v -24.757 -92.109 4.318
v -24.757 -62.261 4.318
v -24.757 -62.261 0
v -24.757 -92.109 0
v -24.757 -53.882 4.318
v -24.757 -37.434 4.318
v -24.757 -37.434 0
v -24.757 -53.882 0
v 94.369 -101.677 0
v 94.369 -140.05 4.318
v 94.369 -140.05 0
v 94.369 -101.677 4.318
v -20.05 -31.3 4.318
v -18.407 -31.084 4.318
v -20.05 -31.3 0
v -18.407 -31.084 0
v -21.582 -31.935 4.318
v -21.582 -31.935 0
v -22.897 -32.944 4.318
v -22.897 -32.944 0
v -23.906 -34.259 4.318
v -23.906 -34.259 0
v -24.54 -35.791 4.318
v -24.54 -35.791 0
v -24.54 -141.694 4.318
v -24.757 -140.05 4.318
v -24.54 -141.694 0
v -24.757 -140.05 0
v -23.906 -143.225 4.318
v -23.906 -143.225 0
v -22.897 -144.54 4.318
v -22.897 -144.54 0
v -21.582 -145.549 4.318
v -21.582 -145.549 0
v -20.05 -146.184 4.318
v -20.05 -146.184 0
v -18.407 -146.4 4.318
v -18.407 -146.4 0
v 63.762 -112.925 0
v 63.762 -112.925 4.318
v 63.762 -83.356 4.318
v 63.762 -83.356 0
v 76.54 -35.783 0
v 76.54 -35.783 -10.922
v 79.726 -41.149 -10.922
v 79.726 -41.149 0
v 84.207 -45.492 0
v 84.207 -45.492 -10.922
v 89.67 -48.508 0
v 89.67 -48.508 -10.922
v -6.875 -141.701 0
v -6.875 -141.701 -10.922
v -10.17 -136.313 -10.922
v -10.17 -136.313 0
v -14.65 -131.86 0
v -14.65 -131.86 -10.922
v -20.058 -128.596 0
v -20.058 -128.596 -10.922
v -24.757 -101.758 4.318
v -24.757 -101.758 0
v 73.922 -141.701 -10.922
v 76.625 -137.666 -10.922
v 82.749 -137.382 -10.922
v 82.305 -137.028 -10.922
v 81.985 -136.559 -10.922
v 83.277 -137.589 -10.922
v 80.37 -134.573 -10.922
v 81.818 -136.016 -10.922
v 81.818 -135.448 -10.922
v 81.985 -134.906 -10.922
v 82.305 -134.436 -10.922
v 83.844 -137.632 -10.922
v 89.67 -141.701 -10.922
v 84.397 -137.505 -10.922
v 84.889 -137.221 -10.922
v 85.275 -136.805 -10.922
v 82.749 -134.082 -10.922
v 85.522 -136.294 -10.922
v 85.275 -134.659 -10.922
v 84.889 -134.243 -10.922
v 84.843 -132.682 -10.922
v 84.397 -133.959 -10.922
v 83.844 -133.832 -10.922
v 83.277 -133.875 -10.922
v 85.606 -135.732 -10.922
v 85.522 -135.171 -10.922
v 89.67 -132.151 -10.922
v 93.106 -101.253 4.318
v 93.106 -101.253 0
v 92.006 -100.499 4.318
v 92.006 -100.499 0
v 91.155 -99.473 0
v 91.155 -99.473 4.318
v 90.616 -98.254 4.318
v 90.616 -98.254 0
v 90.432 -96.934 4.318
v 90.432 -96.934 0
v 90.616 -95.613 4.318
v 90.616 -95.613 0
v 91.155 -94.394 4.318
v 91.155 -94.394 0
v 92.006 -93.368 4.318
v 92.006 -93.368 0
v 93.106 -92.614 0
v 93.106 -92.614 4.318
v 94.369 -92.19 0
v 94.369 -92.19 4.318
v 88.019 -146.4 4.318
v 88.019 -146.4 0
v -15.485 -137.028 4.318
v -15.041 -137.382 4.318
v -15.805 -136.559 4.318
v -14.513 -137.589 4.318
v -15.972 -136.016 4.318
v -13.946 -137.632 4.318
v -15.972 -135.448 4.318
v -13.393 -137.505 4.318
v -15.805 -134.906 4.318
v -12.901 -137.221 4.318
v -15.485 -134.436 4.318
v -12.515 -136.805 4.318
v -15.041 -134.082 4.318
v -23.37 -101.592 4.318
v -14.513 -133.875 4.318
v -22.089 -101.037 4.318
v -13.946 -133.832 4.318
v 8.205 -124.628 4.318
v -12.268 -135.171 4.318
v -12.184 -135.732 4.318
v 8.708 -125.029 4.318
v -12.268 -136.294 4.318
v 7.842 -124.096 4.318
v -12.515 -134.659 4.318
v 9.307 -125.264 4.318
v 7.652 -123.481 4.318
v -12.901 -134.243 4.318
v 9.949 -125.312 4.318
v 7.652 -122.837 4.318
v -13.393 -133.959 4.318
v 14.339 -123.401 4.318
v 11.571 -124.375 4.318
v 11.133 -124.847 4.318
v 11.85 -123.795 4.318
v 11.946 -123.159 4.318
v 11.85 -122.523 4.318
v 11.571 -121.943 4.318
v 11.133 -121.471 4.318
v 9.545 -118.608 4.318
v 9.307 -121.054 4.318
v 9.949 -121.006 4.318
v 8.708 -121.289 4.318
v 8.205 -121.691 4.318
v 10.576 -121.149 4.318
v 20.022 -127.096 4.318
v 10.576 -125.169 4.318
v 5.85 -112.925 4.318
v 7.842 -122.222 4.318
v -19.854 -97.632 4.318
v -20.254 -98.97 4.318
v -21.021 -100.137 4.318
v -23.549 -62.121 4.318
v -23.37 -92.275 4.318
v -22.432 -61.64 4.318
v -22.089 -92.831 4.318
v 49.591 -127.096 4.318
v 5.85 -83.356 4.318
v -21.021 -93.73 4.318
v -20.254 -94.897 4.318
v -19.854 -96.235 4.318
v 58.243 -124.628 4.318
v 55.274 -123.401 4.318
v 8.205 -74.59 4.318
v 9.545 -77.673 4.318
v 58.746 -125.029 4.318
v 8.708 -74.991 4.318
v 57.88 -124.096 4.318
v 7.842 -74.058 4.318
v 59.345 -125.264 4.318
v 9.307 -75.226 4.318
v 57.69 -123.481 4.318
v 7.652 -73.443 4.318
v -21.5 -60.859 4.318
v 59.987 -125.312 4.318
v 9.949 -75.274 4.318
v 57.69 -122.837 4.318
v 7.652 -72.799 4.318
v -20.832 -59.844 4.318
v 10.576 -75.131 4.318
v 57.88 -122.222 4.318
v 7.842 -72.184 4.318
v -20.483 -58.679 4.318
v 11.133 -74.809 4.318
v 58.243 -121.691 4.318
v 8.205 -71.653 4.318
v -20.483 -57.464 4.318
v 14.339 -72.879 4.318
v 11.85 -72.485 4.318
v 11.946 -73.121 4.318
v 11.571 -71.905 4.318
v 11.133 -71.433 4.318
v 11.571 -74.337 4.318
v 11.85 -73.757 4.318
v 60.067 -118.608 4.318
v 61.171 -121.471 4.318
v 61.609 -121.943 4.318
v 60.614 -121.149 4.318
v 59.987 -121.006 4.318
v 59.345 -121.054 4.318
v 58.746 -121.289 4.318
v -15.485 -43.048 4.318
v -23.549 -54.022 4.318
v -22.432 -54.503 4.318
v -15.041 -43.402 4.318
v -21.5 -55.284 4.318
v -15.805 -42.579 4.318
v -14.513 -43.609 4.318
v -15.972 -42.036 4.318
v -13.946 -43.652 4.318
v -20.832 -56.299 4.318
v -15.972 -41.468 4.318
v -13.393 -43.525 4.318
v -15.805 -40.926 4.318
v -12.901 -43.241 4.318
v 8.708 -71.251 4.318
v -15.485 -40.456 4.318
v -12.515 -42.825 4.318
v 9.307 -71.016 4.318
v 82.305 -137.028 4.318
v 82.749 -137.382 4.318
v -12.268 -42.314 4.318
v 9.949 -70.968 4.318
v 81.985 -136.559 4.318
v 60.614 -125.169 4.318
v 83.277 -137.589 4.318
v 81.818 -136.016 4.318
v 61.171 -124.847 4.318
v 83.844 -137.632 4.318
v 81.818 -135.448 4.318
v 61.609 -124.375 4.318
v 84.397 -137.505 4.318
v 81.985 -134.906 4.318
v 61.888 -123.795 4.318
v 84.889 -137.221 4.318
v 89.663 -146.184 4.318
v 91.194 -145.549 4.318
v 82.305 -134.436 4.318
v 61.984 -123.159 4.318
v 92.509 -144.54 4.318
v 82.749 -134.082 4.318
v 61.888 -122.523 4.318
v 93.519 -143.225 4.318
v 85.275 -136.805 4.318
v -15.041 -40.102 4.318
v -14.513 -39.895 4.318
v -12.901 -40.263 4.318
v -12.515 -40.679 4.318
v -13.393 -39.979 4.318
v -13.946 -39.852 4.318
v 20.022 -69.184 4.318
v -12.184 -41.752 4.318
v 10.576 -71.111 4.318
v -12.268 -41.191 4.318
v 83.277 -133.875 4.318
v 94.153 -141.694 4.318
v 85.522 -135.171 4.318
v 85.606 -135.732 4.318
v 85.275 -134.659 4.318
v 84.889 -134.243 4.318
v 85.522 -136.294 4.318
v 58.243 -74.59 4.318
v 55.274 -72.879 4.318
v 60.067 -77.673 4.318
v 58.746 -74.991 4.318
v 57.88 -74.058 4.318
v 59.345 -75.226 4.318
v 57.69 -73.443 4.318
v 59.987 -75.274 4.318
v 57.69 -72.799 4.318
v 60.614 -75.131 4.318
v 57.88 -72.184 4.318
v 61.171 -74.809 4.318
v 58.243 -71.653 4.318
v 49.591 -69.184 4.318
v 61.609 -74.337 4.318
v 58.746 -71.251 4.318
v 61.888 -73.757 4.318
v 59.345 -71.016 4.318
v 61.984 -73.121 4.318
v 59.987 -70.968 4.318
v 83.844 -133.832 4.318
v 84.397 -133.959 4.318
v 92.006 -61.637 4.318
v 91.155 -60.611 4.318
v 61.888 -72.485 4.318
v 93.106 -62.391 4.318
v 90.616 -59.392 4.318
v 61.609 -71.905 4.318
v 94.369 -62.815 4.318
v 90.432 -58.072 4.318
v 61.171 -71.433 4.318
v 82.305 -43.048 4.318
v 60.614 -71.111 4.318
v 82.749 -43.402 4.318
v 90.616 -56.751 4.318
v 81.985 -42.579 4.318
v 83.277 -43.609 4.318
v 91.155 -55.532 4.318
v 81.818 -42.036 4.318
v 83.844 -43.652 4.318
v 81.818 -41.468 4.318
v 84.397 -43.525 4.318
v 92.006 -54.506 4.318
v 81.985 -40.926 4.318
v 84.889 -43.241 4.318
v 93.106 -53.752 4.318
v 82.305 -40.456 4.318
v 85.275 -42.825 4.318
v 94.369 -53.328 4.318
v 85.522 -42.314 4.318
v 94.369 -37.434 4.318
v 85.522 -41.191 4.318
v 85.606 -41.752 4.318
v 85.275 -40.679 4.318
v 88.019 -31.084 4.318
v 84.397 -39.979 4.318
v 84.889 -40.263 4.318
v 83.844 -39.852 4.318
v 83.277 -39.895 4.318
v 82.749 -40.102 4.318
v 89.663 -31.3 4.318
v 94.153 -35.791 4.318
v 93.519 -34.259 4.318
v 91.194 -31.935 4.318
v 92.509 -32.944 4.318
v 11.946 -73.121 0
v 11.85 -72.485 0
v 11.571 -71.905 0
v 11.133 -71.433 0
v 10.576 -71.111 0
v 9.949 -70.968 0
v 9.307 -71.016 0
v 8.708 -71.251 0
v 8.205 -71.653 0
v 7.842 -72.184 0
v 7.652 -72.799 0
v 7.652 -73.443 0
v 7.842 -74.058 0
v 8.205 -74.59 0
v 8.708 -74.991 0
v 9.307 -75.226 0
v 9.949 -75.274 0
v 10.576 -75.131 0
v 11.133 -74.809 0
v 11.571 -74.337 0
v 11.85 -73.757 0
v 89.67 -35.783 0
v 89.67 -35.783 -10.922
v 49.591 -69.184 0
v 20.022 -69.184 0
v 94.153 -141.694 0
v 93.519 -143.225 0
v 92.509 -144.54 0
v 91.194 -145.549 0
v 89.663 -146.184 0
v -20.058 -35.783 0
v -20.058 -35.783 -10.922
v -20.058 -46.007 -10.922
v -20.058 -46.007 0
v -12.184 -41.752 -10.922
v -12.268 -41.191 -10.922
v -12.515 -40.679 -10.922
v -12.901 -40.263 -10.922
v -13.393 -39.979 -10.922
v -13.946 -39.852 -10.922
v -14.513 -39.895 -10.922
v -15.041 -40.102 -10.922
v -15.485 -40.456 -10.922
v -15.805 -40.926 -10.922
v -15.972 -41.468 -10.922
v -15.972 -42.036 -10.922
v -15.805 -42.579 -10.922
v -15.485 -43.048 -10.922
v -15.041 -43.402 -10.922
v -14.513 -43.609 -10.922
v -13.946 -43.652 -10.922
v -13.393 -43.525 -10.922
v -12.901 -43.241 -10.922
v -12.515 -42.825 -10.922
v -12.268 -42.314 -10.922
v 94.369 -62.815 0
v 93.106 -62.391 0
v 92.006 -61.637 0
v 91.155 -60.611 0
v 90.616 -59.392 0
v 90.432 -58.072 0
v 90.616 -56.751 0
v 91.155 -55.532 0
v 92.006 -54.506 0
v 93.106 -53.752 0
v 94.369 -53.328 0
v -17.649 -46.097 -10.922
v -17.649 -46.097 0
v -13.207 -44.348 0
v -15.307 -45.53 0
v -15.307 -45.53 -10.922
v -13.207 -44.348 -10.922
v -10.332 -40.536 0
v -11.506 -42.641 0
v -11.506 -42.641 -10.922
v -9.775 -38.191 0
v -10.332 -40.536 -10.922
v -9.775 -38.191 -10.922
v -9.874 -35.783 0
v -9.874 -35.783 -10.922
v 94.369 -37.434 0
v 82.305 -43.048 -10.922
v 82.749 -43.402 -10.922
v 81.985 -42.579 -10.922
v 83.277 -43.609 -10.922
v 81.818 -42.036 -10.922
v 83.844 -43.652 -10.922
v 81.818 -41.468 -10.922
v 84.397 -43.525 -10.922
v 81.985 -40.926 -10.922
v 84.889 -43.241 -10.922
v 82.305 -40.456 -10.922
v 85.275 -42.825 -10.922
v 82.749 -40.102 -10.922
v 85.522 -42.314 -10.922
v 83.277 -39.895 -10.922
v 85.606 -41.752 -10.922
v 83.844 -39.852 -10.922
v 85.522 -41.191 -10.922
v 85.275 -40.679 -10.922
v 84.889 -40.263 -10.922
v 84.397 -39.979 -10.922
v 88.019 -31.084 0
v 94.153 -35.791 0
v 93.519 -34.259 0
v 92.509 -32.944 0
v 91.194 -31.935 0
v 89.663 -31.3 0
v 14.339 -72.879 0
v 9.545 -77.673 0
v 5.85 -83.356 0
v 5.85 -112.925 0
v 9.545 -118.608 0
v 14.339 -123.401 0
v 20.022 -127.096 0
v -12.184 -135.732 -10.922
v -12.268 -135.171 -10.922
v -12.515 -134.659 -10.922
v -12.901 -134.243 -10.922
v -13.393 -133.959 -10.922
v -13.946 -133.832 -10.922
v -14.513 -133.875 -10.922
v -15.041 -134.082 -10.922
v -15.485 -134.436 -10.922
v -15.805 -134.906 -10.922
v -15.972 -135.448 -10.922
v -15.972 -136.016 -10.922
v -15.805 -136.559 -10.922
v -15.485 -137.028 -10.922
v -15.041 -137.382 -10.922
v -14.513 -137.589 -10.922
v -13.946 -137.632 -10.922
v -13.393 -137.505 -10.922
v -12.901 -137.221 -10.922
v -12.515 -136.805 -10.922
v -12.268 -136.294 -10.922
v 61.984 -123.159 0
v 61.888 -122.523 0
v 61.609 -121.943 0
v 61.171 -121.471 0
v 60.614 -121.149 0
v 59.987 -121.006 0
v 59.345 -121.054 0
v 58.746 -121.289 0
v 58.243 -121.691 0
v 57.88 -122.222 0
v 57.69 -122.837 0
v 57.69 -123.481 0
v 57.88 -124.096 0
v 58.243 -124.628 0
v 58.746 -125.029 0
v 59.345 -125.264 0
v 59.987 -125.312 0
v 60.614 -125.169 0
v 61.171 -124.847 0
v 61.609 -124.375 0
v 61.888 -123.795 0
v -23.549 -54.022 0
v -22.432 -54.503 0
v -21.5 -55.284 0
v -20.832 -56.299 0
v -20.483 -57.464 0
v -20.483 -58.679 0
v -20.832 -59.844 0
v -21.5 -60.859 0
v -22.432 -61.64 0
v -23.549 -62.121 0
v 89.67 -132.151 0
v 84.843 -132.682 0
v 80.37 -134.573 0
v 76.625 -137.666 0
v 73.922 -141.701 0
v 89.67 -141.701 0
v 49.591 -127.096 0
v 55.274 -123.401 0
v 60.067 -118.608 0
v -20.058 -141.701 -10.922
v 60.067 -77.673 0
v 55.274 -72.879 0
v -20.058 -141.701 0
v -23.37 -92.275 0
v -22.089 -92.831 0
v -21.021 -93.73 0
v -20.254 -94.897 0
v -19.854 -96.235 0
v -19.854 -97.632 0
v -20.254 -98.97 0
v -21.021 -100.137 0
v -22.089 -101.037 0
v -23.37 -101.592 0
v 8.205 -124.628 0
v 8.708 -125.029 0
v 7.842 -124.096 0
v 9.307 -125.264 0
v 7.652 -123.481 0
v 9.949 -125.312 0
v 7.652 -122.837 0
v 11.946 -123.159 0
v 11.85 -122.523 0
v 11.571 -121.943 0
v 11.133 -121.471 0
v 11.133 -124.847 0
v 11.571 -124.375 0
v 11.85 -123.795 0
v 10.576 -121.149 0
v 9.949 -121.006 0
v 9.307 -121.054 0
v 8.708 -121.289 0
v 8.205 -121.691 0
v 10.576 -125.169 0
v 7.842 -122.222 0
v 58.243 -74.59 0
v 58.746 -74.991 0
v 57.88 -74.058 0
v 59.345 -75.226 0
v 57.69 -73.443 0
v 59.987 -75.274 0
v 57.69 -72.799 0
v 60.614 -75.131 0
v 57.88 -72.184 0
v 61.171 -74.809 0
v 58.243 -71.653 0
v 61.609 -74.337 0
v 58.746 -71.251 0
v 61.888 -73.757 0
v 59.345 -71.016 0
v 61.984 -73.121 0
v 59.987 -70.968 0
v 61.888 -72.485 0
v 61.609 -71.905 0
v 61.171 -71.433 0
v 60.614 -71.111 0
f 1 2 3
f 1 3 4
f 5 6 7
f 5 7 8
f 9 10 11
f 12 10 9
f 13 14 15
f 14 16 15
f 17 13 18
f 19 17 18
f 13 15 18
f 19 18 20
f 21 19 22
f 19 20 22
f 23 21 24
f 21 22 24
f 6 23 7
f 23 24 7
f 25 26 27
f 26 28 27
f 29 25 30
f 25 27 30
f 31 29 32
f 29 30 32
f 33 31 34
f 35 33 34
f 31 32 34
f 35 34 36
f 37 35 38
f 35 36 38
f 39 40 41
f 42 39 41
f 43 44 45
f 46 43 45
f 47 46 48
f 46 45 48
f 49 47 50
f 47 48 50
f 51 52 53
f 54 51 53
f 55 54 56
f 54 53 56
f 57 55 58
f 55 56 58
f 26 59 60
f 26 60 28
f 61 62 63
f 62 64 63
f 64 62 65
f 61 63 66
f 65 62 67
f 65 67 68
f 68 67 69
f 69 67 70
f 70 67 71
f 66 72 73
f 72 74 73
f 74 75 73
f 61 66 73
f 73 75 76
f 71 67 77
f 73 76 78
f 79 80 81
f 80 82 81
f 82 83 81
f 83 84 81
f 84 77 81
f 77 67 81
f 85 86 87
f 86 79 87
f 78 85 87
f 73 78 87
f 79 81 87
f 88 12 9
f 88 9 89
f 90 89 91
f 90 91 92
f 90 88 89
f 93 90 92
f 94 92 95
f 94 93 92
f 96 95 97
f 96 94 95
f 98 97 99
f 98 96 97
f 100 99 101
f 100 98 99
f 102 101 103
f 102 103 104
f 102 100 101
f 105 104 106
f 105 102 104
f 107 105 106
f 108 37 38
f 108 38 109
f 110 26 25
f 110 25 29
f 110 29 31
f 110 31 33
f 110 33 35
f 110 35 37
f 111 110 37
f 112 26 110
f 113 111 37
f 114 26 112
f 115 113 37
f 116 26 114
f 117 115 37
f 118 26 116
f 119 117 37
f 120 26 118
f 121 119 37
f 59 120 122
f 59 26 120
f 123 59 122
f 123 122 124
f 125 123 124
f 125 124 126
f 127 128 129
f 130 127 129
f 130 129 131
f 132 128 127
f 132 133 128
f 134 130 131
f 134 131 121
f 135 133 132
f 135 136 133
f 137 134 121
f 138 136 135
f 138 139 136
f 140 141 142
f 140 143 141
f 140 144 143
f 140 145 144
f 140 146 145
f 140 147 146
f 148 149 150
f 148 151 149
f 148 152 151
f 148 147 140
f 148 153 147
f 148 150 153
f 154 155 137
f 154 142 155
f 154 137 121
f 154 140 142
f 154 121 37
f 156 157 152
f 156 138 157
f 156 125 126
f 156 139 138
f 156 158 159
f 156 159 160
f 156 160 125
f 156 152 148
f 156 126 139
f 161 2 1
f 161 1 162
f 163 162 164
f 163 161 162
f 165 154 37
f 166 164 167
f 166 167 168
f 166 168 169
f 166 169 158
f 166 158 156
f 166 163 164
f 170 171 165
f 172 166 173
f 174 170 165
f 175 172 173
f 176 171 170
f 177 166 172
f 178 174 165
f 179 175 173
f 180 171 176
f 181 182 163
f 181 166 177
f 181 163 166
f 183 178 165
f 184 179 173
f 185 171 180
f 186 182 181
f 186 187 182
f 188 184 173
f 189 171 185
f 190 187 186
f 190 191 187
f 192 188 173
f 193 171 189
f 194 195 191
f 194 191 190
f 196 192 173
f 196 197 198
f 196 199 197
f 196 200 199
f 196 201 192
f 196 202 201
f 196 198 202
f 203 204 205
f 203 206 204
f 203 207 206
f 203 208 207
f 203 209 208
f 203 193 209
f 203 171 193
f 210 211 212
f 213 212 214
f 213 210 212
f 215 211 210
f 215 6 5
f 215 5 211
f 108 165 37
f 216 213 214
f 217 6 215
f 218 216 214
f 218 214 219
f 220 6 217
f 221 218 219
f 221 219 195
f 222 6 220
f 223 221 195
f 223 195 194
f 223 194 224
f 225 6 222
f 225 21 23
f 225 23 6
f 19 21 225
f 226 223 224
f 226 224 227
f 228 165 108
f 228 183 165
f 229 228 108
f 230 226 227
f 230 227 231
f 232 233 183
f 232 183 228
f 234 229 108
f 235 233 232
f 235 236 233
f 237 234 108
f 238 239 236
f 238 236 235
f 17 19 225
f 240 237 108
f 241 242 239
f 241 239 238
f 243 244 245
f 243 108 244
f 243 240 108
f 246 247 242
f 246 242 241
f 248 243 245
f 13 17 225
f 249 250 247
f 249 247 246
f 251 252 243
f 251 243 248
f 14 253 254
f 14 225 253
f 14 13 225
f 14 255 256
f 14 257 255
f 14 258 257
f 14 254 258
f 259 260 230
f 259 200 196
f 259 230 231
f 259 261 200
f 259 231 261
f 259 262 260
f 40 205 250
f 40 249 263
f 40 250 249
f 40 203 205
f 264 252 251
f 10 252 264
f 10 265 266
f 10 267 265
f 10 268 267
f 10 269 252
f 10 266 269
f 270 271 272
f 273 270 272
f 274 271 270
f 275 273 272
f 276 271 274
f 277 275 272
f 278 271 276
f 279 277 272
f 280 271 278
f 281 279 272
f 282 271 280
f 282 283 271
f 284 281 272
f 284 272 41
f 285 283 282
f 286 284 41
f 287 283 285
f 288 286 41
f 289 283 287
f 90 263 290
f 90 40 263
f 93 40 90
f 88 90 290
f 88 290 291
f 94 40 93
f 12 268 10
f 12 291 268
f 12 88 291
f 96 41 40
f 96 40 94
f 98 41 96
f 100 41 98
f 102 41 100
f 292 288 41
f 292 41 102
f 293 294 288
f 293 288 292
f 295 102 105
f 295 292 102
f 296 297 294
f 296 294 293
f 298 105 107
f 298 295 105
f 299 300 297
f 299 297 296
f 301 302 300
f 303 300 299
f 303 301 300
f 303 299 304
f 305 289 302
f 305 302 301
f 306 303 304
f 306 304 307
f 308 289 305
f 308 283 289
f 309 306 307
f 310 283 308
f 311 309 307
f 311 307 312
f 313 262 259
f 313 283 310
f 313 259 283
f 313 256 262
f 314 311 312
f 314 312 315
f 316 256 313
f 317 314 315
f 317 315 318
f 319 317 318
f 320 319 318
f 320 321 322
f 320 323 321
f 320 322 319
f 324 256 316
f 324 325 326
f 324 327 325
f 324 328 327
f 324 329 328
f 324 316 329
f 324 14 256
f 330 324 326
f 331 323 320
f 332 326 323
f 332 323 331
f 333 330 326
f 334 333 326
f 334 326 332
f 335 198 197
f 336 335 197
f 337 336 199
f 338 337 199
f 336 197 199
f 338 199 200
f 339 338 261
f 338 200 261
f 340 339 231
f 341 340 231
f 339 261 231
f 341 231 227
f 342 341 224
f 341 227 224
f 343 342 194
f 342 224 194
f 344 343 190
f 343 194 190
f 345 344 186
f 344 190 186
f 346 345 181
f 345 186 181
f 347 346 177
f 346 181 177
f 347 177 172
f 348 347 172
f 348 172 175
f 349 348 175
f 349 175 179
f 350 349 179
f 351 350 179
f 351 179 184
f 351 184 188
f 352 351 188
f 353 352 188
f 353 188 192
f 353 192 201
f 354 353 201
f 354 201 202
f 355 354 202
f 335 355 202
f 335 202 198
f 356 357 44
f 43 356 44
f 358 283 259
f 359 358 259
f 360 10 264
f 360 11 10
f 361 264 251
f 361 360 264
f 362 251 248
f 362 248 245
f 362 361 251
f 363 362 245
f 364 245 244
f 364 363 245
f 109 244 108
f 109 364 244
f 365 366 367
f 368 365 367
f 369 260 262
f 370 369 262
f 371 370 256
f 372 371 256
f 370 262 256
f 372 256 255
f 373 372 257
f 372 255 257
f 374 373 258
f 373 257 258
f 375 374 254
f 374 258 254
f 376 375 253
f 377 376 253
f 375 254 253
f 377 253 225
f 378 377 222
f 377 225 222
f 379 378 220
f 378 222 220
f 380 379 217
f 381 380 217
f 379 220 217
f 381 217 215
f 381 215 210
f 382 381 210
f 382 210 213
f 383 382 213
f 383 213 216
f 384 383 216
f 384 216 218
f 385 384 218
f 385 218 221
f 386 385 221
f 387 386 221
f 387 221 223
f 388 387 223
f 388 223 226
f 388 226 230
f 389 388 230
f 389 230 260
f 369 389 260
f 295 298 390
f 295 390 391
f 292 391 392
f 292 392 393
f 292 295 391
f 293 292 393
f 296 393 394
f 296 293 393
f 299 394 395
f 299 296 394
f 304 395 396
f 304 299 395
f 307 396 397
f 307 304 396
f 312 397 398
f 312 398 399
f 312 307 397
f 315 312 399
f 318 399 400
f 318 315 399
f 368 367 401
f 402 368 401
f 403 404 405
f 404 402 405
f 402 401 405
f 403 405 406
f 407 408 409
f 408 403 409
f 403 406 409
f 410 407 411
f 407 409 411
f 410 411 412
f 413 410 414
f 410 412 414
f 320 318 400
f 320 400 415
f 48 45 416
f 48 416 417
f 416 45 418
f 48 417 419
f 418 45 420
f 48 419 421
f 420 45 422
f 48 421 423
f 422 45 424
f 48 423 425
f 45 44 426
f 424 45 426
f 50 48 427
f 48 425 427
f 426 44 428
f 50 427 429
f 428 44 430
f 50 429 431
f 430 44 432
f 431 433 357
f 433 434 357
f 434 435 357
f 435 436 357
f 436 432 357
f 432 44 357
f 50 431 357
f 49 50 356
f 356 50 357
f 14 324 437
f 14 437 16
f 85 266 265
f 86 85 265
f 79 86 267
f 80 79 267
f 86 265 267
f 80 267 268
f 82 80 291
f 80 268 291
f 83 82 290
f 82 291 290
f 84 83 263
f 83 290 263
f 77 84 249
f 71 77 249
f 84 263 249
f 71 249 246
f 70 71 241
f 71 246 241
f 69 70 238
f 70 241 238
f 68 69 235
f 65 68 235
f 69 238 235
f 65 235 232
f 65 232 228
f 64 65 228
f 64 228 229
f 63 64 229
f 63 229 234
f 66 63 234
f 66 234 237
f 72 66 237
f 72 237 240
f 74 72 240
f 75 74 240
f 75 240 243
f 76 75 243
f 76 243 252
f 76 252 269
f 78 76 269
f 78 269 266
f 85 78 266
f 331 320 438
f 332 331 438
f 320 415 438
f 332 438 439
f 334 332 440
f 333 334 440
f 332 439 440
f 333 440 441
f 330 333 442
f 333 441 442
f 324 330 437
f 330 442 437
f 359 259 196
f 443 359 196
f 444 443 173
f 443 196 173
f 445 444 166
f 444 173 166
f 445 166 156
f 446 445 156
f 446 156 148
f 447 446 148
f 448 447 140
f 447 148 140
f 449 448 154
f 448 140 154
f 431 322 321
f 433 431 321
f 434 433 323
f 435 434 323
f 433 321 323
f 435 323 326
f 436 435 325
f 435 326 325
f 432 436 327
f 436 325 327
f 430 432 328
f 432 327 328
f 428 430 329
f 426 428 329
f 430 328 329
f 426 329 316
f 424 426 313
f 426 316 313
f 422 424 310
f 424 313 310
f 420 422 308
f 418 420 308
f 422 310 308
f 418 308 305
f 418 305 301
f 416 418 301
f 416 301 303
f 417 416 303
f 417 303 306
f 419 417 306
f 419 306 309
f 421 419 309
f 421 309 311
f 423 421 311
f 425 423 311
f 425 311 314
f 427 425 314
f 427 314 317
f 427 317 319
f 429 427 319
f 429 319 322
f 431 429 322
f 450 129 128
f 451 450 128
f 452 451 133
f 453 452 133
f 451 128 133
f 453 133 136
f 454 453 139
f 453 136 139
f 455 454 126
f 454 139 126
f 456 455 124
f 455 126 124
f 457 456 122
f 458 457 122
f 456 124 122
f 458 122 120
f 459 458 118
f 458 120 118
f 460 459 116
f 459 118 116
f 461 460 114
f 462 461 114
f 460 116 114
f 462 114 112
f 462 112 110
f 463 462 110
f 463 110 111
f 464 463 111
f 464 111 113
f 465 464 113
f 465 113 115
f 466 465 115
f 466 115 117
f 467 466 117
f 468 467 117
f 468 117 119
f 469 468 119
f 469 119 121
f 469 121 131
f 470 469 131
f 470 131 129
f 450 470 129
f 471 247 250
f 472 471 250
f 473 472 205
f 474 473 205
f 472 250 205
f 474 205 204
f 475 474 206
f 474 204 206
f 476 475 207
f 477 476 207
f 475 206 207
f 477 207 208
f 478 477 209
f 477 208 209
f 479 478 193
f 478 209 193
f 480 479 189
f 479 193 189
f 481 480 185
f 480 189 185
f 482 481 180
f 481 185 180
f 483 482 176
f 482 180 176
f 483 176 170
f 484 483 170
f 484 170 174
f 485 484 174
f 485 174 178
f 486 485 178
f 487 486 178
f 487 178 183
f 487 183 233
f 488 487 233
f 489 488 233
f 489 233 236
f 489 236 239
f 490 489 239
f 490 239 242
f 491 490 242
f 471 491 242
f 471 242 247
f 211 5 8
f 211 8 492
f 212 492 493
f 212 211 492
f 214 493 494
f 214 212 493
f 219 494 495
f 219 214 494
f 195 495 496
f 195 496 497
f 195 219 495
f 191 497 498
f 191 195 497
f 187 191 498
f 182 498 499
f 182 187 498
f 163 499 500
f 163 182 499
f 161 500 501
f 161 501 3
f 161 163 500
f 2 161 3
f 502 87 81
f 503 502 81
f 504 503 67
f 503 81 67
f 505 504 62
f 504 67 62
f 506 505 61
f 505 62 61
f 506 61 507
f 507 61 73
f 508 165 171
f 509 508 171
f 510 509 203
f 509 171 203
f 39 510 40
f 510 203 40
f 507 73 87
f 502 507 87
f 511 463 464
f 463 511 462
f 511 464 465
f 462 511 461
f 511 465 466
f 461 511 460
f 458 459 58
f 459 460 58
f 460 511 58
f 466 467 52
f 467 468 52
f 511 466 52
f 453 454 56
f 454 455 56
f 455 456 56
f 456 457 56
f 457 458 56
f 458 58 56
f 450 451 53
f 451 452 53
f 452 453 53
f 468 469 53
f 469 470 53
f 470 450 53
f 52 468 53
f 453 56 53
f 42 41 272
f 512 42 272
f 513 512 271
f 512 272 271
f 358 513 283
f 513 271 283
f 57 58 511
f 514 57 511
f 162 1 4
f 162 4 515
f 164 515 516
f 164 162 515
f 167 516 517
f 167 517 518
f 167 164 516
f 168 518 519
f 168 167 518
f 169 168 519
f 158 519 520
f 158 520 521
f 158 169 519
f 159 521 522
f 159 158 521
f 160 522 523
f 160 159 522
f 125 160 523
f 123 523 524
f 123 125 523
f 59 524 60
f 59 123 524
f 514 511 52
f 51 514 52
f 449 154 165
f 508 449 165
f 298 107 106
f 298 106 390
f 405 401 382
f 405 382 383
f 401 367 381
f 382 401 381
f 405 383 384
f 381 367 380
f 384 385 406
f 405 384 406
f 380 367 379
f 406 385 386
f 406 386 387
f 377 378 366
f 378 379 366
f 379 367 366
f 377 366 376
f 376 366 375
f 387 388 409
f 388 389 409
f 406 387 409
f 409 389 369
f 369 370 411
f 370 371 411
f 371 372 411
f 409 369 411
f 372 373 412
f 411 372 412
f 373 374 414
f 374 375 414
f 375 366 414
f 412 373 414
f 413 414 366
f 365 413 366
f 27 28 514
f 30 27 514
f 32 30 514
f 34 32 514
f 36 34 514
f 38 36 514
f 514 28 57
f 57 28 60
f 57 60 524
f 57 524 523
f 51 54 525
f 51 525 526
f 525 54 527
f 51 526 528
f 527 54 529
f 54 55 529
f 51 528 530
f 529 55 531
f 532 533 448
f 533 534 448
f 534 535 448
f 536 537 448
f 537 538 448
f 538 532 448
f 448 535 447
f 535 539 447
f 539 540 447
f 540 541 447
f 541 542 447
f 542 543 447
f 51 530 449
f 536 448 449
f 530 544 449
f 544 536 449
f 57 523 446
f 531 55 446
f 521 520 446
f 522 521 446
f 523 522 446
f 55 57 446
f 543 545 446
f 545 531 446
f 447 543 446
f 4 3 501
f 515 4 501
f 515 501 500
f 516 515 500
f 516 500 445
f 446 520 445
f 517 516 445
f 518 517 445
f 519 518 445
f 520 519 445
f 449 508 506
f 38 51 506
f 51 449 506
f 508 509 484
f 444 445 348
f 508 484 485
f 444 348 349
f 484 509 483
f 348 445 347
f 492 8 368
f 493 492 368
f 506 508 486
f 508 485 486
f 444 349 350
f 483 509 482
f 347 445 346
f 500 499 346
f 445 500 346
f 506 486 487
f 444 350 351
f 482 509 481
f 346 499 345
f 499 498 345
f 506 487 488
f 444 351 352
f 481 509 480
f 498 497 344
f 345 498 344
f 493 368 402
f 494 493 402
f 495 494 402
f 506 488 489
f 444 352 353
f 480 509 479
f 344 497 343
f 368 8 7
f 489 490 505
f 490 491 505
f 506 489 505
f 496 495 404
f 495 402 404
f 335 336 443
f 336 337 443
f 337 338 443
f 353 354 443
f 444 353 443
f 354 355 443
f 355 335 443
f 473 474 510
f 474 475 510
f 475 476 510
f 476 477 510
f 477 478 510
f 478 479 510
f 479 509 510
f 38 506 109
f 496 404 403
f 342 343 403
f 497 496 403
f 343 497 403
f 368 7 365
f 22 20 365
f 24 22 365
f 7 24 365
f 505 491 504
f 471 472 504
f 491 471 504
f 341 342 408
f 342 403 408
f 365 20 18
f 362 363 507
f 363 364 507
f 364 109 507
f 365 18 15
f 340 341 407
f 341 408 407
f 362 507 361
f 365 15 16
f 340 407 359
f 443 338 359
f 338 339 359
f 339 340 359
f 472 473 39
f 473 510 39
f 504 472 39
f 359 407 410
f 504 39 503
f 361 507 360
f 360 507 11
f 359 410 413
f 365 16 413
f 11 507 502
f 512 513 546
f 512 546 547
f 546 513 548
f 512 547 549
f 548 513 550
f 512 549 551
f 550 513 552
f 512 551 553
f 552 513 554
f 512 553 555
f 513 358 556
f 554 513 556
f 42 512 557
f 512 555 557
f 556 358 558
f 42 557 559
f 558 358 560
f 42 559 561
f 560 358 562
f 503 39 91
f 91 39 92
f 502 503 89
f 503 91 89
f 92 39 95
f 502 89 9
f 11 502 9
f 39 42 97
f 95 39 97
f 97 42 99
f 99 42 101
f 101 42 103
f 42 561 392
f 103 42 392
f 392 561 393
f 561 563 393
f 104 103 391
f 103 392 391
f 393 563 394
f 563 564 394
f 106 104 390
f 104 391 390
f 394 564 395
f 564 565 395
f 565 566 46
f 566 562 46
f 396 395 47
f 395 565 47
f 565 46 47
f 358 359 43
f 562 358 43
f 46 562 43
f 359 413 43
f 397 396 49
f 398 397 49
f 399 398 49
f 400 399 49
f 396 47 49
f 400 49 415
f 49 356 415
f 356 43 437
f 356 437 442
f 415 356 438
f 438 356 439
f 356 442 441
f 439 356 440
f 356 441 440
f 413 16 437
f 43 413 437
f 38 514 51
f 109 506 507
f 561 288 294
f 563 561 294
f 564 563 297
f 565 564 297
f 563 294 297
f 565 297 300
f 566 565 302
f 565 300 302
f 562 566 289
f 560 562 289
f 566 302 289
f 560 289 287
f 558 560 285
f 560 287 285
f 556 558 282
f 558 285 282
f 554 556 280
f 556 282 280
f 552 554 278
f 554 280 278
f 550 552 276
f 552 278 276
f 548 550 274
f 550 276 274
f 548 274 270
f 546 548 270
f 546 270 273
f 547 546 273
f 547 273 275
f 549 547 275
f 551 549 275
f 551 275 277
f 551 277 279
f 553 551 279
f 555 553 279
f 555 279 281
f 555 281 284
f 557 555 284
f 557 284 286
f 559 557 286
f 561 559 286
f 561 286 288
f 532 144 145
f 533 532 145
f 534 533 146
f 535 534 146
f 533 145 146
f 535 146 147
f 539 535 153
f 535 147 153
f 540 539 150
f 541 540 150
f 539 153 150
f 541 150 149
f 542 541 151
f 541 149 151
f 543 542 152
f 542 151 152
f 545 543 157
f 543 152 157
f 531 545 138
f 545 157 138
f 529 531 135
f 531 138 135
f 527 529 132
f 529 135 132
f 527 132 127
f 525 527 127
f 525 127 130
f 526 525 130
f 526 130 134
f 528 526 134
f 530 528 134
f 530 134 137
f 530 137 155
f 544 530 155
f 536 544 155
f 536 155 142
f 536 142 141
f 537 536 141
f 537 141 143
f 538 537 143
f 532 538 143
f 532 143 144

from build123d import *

# Parameters (mm, degrees)
SKETCH1_R                 = 2.54
SKETCH1_R_2               = 1.905
BOSS_EXTRUDE1_DEPTH       = 10.922
BOSS_EXTRUDE1_2_DEPTH     = 10.922
BOSS_EXTRUDE1_3_DEPTH     = 10.922
BOSS_EXTRUDE1_4_DEPTH     = 10.922
BOSS_EXTRUDE3_START       = -10.922
BOSS_EXTRUDE3_OUTLINE_R   = 1.905
BOSS_EXTRUDE3_DEPTH       = 10.922
BOSS_EXTRUDE3_2_OUTLINE_R = 1.905
BOSS_EXTRUDE3_2_DEPTH     = 10.922
BOSS_EXTRUDE3_3_OUTLINE_R = 1.905
BOSS_EXTRUDE3_3_DEPTH     = 10.922
BOSS_EXTRUDE3_4_OUTLINE_R = 1.905
BOSS_EXTRUDE3_4_DEPTH     = 10.922
BOSS_EXTRUDE4_START       = 4.318
SKETCH3_R                 = 1.905
BOSS_EXTRUDE4_DEPTH       = 4.318
FILLET1_R                 = 6.35
CUT_EXTRUDE1_REACH        = 176.845
SKETCH5_R                 = 2.159


with BuildPart() as part:
    # Sketch1 → Boss-Extrude1 (new body)
    with BuildSketch(Plane.XY):
        with Locations((83.701311305, -41.752062977)):
            Circle(SKETCH1_R)
        with Locations((83.701311305, -41.752062977)):
            Circle(SKETCH1_R_2, mode=Mode.SUBTRACT)
    extrude(amount=-BOSS_EXTRUDE1_DEPTH)

    # Boss-Extrude3: read off the stored shape, not the designer's step
    # Boss-Extrude3 outline → Boss-Extrude3 (add)
    with BuildSketch(Plane.XY.offset(BOSS_EXTRUDE3_START)):
        with BuildLine():
            Line((89.670311305, -35.783062977), (76.540111305, -35.783062977))
            ThreePointArc((76.540111305, -35.783062977), (81.82257698, -43.469198406), (89.670311305, -48.508462977))
            Line((89.670311305, -48.508462977), (89.670311305, -35.783062977))
        make_face()
        with Locations((83.701311305, -41.752062977)):
            Circle(BOSS_EXTRUDE3_OUTLINE_R, mode=Mode.SUBTRACT)
    extrude(amount=BOSS_EXTRUDE3_DEPTH)



with BuildPart() as body_2:
    # Sketch1 → Boss-Extrude1 2 (new body)
    with BuildSketch(Plane.XY):
        with Locations((-14.088688695, -41.752062977)):
            Circle(SKETCH1_R)
        with Locations((-14.088688695, -41.752062977)):
            Circle(SKETCH1_R_2, mode=Mode.SUBTRACT)
    extrude(amount=-BOSS_EXTRUDE1_2_DEPTH)

    # Boss-Extrude3 4 outline → Boss-Extrude3 4 (add)
    with BuildSketch(Plane.XY.offset(BOSS_EXTRUDE3_START)):
        with BuildLine():
            Line((-20.057688695, -35.783062977), (-20.057688695, -46.006562977))
            ThreePointArc((-20.057688695, -46.006562977), (-12.297393991, -43.552911895), (-9.874167768, -35.783062977))
            Line((-9.874167768, -35.783062977), (-20.057688695, -35.783062977))
        make_face()
        with Locations((-14.088688695, -41.752062977)):
            Circle(BOSS_EXTRUDE3_4_OUTLINE_R, mode=Mode.SUBTRACT)
    extrude(amount=BOSS_EXTRUDE3_4_DEPTH)


with BuildPart() as body_3:
    # Sketch1 → Boss-Extrude1 3 (new body)
    with BuildSketch(Plane.XY):
        with Locations((-14.088688695, -135.732062977)):
            Circle(SKETCH1_R)
        with Locations((-14.088688695, -135.732062977)):
            Circle(SKETCH1_R_2, mode=Mode.SUBTRACT)
    extrude(amount=-BOSS_EXTRUDE1_3_DEPTH)

    # Boss-Extrude3 3 outline → Boss-Extrude3 3 (add)
    with BuildSketch(Plane.XY.offset(BOSS_EXTRUDE3_START)):
        with BuildLine():
            Line((-20.057688695, -141.701062977), (-6.875088695, -141.701062977))
            ThreePointArc((-6.875088695, -141.701062977), (-12.276682873, -133.951830584), (-20.057688695, -128.59610741))
            Line((-20.057688695, -128.59610741), (-20.057688695, -141.701062977))
        make_face()
        with Locations((-14.088688695, -135.732062977)):
            Circle(BOSS_EXTRUDE3_3_OUTLINE_R, mode=Mode.SUBTRACT)
    extrude(amount=BOSS_EXTRUDE3_3_DEPTH)


with BuildPart() as body_4:
    # Sketch1 → Boss-Extrude1 4 (new body)
    with BuildSketch(Plane.XY):
        with Locations((83.701311305, -135.732062977)):
            Circle(SKETCH1_R)
        with Locations((83.701311305, -135.732062977)):
            Circle(SKETCH1_R_2, mode=Mode.SUBTRACT)
    extrude(amount=-BOSS_EXTRUDE1_4_DEPTH)

    # Boss-Extrude3 2 outline → Boss-Extrude3 2 (add)
    with BuildSketch(Plane.XY.offset(BOSS_EXTRUDE3_START)):
        with BuildLine():
            Line((89.670311305, -141.701062977), (89.670311305, -132.150662977))
            ThreePointArc((89.670311305, -132.150662977), (80.369588205, -134.573287653), (73.922311305, -141.701062977))
            Line((73.922311305, -141.701062977), (89.670311305, -141.701062977))
        make_face()
        with Locations((83.701311305, -135.732062977)):
            Circle(BOSS_EXTRUDE3_2_OUTLINE_R, mode=Mode.SUBTRACT)
    extrude(amount=BOSS_EXTRUDE3_2_DEPTH)


with BuildPart() as part_1:
    add(part.part)

    add(body_2.part)  # Boss-Extrude4 merges body 2

    add(body_3.part)  # Boss-Extrude4 merges body 3

    add(body_4.part)  # Boss-Extrude4 merges body 4
    # Sketch3 → Boss-Extrude4 (add)
    with BuildSketch(Plane.XY.offset(BOSS_EXTRUDE4_START)):
        with BuildLine():
            Line((-24.756688695, -101.757891635), (-24.756688695, -146.400062977))
            Line((-24.756688695, -146.400062977), (94.369311305, -146.400062977))
            Line((94.369311305, -146.400062977), (94.369311305, -101.676974724))
            ThreePointArc((94.369311305, -101.676974724), (90.432311305, -96.933562977), (94.369311305, -92.19015123))
            Line((94.369311305, -92.19015123), (94.369311305, -62.814974724))
            ThreePointArc((94.369311305, -62.814974724), (90.432311305, -58.071562977), (94.369311305, -53.32815123))
            Line((94.369311305, -53.32815123), (94.369311305, -31.084062977))
            Line((94.369311305, -31.084062977), (-24.756688695, -31.084062977))
            Line((-24.756688695, -31.084062977), (-24.756688695, -53.882487661))
            ThreePointArc((-24.756688695, -53.882487661), (-20.438688695, -58.071562977), (-24.756688695, -62.260638293))
            Line((-24.756688695, -62.260638293), (-24.756688695, -92.109234319))
            ThreePointArc((-24.756688695, -92.109234319), (-19.803688695, -96.933562977), (-24.756688695, -101.757891635))
        make_face()
        with Locations((83.701311305, -41.752062977)):
            Circle(SKETCH3_R, mode=Mode.SUBTRACT)
        with Locations((-14.088688695, -135.732062977)):
            Circle(SKETCH3_R, mode=Mode.SUBTRACT)
        with Locations((83.701311305, -135.732062977)):
            Circle(SKETCH3_R, mode=Mode.SUBTRACT)
        with Locations((-14.088688695, -41.752062977)):
            Circle(SKETCH3_R, mode=Mode.SUBTRACT)
    extrude(amount=-BOSS_EXTRUDE4_DEPTH)

    # Fillet1
    fillet1_edges = [part_1.edges().sort_by_distance(p)[0] for p in [
        (-24.756688695, -146.400062977, 2.159),
        (94.369311305, -146.400062977, 2.159),
        (94.369311305, -31.084062977, 2.159),
        (-24.756688695, -31.084062977, 2.159),
    ]]
    fillet(fillet1_edges, radius=FILLET1_R)

    # Sketch5 → Cut-Extrude1 (cut, up to next)
    with BuildSketch(Plane.XY.offset(4.318), mode=Mode.PRIVATE) as cut_extrude1_sk1:
        with BuildLine():
            Line((5.850311305, -98.140062977), (34.806311305, -98.140062977))
            Line((34.806311305, -98.140062977), (34.806311305, -69.184062977))
            Line((34.806311305, -69.184062977), (20.021852978, -69.184062977))
            ThreePointArc((20.021852978, -69.184062977), (11.816855635, -75.150607307), (5.850311305, -83.355604651))
            Line((5.850311305, -83.355604651), (5.850311305, -98.140062977))
        make_face()
    cut_extrude1_tool1 = extrude(cut_extrude1_sk1.sketch, amount=-CUT_EXTRUDE1_REACH, mode=Mode.PRIVATE) & part_1.part
    # Sketch5 → Cut-Extrude1 (cut, up to next)
    with BuildSketch(Plane.XY.offset(4.318), mode=Mode.PRIVATE) as cut_extrude1_sk2:
        with BuildLine():
            Line((34.806311305, -69.184062977), (34.806311305, -98.140062977))
            Line((34.806311305, -98.140062977), (63.762311305, -98.140062977))
            Line((63.762311305, -98.140062977), (63.762311305, -83.355604651))
            ThreePointArc((63.762311305, -83.355604651), (57.795766975, -75.150607307), (49.590769631, -69.184062977))
            Line((49.590769631, -69.184062977), (34.806311305, -69.184062977))
        make_face()
    cut_extrude1_tool2 = extrude(cut_extrude1_sk2.sketch, amount=-CUT_EXTRUDE1_REACH, mode=Mode.PRIVATE) & part_1.part
    # Sketch5 → Cut-Extrude1 (cut, up to next)
    with BuildSketch(Plane.XY.offset(4.318), mode=Mode.PRIVATE) as cut_extrude1_sk3:
        with Locations((9.787309036, -73.121060708)):
            Circle(SKETCH5_R)
    cut_extrude1_tool3 = extrude(cut_extrude1_sk3.sketch, amount=-CUT_EXTRUDE1_REACH, mode=Mode.PRIVATE) & part_1.part
    # Sketch5 → Cut-Extrude1 (cut, up to next)
    with BuildSketch(Plane.XY.offset(4.318), mode=Mode.PRIVATE) as cut_extrude1_sk4:
        with Locations((59.825309036, -73.121065246)):
            Circle(SKETCH5_R)
    cut_extrude1_tool4 = extrude(cut_extrude1_sk4.sketch, amount=-CUT_EXTRUDE1_REACH, mode=Mode.PRIVATE) & part_1.part
    # Sketch5 → Cut-Extrude1 (cut, up to next)
    with BuildSketch(Plane.XY.offset(4.318), mode=Mode.PRIVATE) as cut_extrude1_sk5:
        with Locations((59.825313573, -123.159065246)):
            Circle(SKETCH5_R)
    cut_extrude1_tool5 = extrude(cut_extrude1_sk5.sketch, amount=-CUT_EXTRUDE1_REACH, mode=Mode.PRIVATE) & part_1.part
    # Sketch5 → Cut-Extrude1 (cut, up to next)
    with BuildSketch(Plane.XY.offset(4.318), mode=Mode.PRIVATE) as cut_extrude1_sk6:
        with BuildLine():
            Line((34.806311305, -98.140062977), (34.806311305, -127.096062977))
            Line((34.806311305, -127.096062977), (49.590769631, -127.096062977))
            ThreePointArc((49.590769631, -127.096062977), (57.795766975, -121.129518647), (63.762311305, -112.924521303))
            Line((63.762311305, -112.924521303), (63.762311305, -98.140062977))
            Line((63.762311305, -98.140062977), (34.806311305, -98.140062977))
        make_face()
    cut_extrude1_tool6 = extrude(cut_extrude1_sk6.sketch, amount=-CUT_EXTRUDE1_REACH, mode=Mode.PRIVATE) & part_1.part
    # Sketch5 → Cut-Extrude1 (cut, up to next)
    with BuildSketch(Plane.XY.offset(4.318), mode=Mode.PRIVATE) as cut_extrude1_sk7:
        with BuildLine():
            Line((20.021852978, -127.096062977), (34.806311305, -127.096062977))
            Line((34.806311305, -127.096062977), (34.806311305, -98.140062977))
            Line((34.806311305, -98.140062977), (5.850311305, -98.140062977))
            Line((5.850311305, -98.140062977), (5.850311305, -112.924521303))
            ThreePointArc((5.850311305, -112.924521303), (11.816855635, -121.129518647), (20.021852978, -127.096062977))
        make_face()
    cut_extrude1_tool7 = extrude(cut_extrude1_sk7.sketch, amount=-CUT_EXTRUDE1_REACH, mode=Mode.PRIVATE) & part_1.part
    # Sketch5 → Cut-Extrude1 (cut, up to next)
    with BuildSketch(Plane.XY.offset(4.318), mode=Mode.PRIVATE) as cut_extrude1_sk8:
        with Locations((9.787313573, -123.159060708)):
            Circle(SKETCH5_R)
    cut_extrude1_tool8 = extrude(cut_extrude1_sk8.sketch, amount=-CUT_EXTRUDE1_REACH, mode=Mode.PRIVATE) & part_1.part
    add(cut_extrude1_tool1.solids().sort_by_distance((21.39883, -84.732582, 4.318))[0], mode=Mode.SUBTRACT)
    add(cut_extrude1_tool2.solids().sort_by_distance((48.213793, -84.732582, 4.318))[0], mode=Mode.SUBTRACT)
    add(cut_extrude1_tool3.solids().sort_by_distance((9.787309, -73.121061, 4.318))[0], mode=Mode.SUBTRACT)
    add(cut_extrude1_tool4.solids().sort_by_distance((59.825309, -73.121065, 4.318))[0], mode=Mode.SUBTRACT)
    add(cut_extrude1_tool5.solids().sort_by_distance((59.825314, -123.159065, 4.318))[0], mode=Mode.SUBTRACT)
    add(cut_extrude1_tool6.solids().sort_by_distance((48.213793, -111.547544, 4.318))[0], mode=Mode.SUBTRACT)
    add(cut_extrude1_tool7.solids().sort_by_distance((21.39883, -111.547544, 4.318))[0], mode=Mode.SUBTRACT)
    add(cut_extrude1_tool8.solids().sort_by_distance((9.787314, -123.159061, 4.318))[0], mode=Mode.SUBTRACT)


solid = part_1.part
